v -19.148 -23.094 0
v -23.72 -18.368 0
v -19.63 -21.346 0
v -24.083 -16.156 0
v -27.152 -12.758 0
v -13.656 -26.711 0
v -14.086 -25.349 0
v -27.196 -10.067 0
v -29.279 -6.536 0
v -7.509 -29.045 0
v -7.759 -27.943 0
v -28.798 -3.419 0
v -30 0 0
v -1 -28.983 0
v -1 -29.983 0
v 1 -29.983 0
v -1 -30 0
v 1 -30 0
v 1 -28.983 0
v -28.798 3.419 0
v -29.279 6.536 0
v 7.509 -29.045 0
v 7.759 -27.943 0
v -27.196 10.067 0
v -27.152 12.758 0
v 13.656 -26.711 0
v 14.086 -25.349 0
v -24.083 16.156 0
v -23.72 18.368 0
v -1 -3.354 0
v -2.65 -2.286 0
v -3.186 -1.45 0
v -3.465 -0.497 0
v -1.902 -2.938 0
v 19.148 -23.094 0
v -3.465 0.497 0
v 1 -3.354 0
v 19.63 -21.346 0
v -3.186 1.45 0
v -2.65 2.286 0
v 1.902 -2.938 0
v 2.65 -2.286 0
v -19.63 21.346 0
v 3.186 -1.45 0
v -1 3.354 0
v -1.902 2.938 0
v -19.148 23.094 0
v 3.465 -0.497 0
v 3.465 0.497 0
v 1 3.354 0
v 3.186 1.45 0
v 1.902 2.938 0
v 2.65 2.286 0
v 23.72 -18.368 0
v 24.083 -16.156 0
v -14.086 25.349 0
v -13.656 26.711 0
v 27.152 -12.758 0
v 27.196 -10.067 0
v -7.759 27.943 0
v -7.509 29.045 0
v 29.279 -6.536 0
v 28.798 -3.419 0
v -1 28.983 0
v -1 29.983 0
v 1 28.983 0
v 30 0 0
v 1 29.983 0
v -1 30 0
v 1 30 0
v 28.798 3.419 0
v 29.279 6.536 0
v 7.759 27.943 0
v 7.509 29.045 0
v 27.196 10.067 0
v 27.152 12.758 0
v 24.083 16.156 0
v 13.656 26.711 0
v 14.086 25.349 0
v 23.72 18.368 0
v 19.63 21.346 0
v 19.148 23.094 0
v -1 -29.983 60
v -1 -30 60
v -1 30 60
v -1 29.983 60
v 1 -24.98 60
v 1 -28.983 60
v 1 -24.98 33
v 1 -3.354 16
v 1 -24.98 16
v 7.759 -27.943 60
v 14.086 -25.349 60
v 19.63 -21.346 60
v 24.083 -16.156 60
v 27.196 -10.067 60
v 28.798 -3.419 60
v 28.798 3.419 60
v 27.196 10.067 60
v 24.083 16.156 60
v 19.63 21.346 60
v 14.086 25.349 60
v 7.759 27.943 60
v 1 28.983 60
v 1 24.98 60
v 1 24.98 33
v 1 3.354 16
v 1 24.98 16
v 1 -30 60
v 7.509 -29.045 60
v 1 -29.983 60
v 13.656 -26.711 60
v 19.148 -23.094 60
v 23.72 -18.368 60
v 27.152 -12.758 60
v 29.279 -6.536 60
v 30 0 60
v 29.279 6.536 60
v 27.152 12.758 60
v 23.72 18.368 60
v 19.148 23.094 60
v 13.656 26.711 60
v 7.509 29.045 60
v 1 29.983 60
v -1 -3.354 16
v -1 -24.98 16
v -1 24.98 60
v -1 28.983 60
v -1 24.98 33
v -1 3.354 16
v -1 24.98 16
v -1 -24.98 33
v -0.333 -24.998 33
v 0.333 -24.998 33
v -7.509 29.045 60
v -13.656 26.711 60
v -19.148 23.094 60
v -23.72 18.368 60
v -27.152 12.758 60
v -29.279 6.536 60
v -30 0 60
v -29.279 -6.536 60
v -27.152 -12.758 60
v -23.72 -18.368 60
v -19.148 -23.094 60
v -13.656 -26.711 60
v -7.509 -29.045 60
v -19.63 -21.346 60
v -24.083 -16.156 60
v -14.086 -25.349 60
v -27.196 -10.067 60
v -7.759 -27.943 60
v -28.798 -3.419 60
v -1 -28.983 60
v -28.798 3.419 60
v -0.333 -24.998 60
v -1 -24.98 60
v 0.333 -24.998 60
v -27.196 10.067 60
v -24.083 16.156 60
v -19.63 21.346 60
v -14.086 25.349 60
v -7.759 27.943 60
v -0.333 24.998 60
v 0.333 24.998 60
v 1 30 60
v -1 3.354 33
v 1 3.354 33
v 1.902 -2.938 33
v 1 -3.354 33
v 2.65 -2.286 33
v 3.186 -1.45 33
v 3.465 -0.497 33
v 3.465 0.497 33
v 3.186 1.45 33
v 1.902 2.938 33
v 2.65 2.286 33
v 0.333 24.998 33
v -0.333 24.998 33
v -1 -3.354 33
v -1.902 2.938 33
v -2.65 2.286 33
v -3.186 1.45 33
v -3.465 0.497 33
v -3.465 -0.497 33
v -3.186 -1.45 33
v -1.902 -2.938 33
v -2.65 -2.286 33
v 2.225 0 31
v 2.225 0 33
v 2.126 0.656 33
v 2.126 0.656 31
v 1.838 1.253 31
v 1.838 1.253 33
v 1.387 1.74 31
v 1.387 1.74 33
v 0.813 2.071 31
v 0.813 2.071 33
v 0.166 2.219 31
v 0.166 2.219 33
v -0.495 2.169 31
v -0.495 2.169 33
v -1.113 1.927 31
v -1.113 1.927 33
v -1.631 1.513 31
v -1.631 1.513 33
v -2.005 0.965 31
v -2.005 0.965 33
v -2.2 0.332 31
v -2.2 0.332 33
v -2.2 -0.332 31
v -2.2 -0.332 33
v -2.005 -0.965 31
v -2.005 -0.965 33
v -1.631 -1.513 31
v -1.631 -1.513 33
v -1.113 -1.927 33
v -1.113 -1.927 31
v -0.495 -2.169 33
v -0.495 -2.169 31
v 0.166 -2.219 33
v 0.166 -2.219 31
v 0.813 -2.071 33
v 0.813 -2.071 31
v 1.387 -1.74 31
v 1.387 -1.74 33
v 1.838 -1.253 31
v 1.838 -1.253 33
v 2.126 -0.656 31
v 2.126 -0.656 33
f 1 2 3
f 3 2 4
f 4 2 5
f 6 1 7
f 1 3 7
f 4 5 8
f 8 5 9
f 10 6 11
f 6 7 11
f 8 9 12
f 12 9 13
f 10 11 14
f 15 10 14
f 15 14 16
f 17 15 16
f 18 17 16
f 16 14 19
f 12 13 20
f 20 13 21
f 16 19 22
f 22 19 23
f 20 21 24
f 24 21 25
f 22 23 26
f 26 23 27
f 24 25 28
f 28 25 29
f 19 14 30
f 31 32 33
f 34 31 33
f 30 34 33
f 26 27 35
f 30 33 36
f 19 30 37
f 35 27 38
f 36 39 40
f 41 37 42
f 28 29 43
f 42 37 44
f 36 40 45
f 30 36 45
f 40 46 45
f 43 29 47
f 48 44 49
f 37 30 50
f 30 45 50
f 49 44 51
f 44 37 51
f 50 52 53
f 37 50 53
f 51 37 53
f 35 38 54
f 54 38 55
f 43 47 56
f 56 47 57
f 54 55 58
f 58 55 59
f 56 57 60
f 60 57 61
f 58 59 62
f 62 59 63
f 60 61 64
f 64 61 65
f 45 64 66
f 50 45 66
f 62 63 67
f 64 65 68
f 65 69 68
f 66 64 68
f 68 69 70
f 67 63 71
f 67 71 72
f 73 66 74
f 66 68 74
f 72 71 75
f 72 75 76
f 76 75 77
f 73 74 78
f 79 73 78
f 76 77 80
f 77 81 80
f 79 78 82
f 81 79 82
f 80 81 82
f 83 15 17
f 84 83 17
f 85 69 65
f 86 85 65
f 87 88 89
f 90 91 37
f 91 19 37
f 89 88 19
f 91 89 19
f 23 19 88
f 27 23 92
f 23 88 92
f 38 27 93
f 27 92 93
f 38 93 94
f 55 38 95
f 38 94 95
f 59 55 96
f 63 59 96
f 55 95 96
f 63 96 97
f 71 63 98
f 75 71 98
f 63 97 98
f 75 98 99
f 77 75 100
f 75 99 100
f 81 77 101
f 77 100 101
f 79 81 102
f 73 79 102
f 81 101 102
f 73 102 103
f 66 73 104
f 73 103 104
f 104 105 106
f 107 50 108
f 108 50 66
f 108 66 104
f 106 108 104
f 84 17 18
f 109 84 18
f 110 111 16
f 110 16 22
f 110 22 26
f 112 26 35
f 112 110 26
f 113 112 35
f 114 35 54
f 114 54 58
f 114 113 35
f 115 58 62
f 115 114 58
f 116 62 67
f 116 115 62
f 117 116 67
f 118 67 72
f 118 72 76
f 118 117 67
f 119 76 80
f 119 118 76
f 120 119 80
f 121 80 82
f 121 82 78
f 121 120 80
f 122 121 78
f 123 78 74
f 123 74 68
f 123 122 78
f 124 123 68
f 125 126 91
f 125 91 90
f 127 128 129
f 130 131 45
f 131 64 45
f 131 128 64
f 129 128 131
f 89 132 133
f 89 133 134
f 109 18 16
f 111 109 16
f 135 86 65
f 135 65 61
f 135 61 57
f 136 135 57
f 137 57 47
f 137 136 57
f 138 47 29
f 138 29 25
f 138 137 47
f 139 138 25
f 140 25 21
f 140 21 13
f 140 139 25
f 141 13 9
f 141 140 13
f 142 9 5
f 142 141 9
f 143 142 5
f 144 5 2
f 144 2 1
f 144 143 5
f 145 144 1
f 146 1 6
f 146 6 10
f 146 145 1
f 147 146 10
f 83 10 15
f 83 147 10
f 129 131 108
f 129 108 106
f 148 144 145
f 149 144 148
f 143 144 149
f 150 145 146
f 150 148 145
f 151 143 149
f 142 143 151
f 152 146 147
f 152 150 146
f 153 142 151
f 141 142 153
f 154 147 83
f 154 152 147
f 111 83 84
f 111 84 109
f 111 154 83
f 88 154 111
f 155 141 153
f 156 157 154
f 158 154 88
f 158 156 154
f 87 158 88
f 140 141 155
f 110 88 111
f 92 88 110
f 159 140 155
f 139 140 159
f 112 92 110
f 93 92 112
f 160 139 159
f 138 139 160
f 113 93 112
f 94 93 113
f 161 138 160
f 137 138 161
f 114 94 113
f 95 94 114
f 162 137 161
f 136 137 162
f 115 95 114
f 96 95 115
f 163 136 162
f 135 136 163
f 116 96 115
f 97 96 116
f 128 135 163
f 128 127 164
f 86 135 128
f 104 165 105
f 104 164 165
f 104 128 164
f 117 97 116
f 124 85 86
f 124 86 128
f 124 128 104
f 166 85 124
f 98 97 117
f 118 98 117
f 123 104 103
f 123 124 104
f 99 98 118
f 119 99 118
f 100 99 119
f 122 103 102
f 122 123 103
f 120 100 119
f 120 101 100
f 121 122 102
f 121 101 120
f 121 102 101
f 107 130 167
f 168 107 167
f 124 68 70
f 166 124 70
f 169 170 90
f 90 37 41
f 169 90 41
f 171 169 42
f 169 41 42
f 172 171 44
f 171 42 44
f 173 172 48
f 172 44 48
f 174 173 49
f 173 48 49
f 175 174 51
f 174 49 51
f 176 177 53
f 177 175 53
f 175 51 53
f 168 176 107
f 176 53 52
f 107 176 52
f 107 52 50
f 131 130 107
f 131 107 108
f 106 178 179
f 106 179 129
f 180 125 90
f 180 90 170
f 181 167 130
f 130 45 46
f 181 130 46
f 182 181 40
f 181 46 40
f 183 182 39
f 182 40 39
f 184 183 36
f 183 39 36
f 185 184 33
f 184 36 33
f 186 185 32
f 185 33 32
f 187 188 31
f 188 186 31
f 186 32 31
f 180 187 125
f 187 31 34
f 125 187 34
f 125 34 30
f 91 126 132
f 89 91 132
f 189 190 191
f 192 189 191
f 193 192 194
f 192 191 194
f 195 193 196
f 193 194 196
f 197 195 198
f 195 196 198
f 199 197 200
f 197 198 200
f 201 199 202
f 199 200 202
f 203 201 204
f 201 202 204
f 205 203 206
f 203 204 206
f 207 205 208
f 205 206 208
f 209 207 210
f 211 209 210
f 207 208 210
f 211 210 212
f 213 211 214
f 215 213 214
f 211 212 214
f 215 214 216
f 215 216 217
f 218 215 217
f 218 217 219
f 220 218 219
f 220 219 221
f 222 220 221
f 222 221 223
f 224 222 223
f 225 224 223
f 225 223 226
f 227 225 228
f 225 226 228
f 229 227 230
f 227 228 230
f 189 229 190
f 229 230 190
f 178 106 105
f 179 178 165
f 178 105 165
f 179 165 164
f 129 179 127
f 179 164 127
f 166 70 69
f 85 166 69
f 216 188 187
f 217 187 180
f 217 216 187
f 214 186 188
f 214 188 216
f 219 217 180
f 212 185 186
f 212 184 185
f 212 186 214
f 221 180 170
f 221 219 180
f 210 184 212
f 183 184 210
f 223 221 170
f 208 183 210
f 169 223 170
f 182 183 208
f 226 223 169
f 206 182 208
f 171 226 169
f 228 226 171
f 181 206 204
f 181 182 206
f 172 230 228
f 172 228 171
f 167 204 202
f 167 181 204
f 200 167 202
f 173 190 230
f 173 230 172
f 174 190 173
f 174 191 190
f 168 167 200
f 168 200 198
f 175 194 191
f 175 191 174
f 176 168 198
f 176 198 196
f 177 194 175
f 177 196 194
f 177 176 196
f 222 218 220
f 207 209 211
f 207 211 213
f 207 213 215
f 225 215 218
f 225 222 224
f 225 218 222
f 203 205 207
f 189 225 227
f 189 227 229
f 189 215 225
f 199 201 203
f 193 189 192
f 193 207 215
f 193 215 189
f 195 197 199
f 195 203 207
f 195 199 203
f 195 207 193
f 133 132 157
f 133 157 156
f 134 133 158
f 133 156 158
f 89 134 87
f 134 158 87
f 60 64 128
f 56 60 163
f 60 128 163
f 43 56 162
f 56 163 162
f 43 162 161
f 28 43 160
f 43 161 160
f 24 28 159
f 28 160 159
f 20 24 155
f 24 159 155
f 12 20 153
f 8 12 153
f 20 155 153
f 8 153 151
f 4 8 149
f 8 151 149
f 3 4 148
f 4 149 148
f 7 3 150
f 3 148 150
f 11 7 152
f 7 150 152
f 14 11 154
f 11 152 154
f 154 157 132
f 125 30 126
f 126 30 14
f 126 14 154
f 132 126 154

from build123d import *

# Parameters (mm, degrees)
BOSS_EXTRU_1_DEPTH      = 60
ESQUISSE2_R             = 30
ESQUISSE2_R_2           = 29
BOSS_EXTRU_2_DEPTH      = 60
ESQUISSE3_R             = 25
ENL_V_MAT_EXTRU_1_DEPTH = 27
ESQUISSE5_W             = 17
ESQUISSE5_H             = 21.625890028
ENL_V_MAT_EXTRU_2_DEPTH = 8
ESQUISSE6_R             = 2.225
ENL_V_MAT_EXTRU_3_DEPTH = 2


with BuildPart() as part:
    # Esquisse1 → Boss.-Extru.1 (new body)
    with BuildSketch(Plane.XY):
        with BuildLine():
            Line((1, -15.006468588), (1, -3.354101966))
            ThreePointArc((1, -3.354101966), (3.5, 0), (1, 3.354101966))
            Line((1, 3.354101966), (1, 30))
            Line((1, 30), (-1, 30))
            Line((-1, 30), (-1, 3.354101966))
            ThreePointArc((-1, 3.354101966), (-3.5, 0), (-1, -3.354101966))
            Line((-1, -3.354101966), (-1, -30))
            Line((-1, -30), (1, -30))
            Line((1, -30), (1, -15.006468588))
        make_face()
    extrude(amount=BOSS_EXTRU_1_DEPTH)

    # Esquisse2 → Boss.-Extru.2 (add)
    with BuildSketch(Plane.XY.offset(60)):
        Circle(ESQUISSE2_R)
        Circle(ESQUISSE2_R_2, mode=Mode.SUBTRACT)
    extrude(amount=-BOSS_EXTRU_2_DEPTH)

    # Esquisse3 → Enlèv. mat.-Extru.1 (cut)
    with BuildSketch(Plane.XY.offset(60)):
        Circle(ESQUISSE3_R)
    extrude(amount=-ENL_V_MAT_EXTRU_1_DEPTH, mode=Mode.SUBTRACT)

    # Esquisse5 → Enlèv. mat.-Extru.2 (cut)
    with BuildSketch(Plane.ZY.offset(1)):
        with Locations((24.5, -14.16704698)):
            Rectangle(ESQUISSE5_W, ESQUISSE5_H)
        with Locations((24.5, 14.16704698)):
            Rectangle(ESQUISSE5_W, ESQUISSE5_H)
    extrude(amount=-ENL_V_MAT_EXTRU_2_DEPTH, mode=Mode.SUBTRACT)

    # Esquisse6 → Enlèv. mat.-Extru.3 (cut)
    with BuildSketch(Plane.XY.offset(33)):
        Circle(ESQUISSE6_R)
    extrude(amount=-ENL_V_MAT_EXTRU_3_DEPTH, mode=Mode.SUBTRACT)


solid = part.part
